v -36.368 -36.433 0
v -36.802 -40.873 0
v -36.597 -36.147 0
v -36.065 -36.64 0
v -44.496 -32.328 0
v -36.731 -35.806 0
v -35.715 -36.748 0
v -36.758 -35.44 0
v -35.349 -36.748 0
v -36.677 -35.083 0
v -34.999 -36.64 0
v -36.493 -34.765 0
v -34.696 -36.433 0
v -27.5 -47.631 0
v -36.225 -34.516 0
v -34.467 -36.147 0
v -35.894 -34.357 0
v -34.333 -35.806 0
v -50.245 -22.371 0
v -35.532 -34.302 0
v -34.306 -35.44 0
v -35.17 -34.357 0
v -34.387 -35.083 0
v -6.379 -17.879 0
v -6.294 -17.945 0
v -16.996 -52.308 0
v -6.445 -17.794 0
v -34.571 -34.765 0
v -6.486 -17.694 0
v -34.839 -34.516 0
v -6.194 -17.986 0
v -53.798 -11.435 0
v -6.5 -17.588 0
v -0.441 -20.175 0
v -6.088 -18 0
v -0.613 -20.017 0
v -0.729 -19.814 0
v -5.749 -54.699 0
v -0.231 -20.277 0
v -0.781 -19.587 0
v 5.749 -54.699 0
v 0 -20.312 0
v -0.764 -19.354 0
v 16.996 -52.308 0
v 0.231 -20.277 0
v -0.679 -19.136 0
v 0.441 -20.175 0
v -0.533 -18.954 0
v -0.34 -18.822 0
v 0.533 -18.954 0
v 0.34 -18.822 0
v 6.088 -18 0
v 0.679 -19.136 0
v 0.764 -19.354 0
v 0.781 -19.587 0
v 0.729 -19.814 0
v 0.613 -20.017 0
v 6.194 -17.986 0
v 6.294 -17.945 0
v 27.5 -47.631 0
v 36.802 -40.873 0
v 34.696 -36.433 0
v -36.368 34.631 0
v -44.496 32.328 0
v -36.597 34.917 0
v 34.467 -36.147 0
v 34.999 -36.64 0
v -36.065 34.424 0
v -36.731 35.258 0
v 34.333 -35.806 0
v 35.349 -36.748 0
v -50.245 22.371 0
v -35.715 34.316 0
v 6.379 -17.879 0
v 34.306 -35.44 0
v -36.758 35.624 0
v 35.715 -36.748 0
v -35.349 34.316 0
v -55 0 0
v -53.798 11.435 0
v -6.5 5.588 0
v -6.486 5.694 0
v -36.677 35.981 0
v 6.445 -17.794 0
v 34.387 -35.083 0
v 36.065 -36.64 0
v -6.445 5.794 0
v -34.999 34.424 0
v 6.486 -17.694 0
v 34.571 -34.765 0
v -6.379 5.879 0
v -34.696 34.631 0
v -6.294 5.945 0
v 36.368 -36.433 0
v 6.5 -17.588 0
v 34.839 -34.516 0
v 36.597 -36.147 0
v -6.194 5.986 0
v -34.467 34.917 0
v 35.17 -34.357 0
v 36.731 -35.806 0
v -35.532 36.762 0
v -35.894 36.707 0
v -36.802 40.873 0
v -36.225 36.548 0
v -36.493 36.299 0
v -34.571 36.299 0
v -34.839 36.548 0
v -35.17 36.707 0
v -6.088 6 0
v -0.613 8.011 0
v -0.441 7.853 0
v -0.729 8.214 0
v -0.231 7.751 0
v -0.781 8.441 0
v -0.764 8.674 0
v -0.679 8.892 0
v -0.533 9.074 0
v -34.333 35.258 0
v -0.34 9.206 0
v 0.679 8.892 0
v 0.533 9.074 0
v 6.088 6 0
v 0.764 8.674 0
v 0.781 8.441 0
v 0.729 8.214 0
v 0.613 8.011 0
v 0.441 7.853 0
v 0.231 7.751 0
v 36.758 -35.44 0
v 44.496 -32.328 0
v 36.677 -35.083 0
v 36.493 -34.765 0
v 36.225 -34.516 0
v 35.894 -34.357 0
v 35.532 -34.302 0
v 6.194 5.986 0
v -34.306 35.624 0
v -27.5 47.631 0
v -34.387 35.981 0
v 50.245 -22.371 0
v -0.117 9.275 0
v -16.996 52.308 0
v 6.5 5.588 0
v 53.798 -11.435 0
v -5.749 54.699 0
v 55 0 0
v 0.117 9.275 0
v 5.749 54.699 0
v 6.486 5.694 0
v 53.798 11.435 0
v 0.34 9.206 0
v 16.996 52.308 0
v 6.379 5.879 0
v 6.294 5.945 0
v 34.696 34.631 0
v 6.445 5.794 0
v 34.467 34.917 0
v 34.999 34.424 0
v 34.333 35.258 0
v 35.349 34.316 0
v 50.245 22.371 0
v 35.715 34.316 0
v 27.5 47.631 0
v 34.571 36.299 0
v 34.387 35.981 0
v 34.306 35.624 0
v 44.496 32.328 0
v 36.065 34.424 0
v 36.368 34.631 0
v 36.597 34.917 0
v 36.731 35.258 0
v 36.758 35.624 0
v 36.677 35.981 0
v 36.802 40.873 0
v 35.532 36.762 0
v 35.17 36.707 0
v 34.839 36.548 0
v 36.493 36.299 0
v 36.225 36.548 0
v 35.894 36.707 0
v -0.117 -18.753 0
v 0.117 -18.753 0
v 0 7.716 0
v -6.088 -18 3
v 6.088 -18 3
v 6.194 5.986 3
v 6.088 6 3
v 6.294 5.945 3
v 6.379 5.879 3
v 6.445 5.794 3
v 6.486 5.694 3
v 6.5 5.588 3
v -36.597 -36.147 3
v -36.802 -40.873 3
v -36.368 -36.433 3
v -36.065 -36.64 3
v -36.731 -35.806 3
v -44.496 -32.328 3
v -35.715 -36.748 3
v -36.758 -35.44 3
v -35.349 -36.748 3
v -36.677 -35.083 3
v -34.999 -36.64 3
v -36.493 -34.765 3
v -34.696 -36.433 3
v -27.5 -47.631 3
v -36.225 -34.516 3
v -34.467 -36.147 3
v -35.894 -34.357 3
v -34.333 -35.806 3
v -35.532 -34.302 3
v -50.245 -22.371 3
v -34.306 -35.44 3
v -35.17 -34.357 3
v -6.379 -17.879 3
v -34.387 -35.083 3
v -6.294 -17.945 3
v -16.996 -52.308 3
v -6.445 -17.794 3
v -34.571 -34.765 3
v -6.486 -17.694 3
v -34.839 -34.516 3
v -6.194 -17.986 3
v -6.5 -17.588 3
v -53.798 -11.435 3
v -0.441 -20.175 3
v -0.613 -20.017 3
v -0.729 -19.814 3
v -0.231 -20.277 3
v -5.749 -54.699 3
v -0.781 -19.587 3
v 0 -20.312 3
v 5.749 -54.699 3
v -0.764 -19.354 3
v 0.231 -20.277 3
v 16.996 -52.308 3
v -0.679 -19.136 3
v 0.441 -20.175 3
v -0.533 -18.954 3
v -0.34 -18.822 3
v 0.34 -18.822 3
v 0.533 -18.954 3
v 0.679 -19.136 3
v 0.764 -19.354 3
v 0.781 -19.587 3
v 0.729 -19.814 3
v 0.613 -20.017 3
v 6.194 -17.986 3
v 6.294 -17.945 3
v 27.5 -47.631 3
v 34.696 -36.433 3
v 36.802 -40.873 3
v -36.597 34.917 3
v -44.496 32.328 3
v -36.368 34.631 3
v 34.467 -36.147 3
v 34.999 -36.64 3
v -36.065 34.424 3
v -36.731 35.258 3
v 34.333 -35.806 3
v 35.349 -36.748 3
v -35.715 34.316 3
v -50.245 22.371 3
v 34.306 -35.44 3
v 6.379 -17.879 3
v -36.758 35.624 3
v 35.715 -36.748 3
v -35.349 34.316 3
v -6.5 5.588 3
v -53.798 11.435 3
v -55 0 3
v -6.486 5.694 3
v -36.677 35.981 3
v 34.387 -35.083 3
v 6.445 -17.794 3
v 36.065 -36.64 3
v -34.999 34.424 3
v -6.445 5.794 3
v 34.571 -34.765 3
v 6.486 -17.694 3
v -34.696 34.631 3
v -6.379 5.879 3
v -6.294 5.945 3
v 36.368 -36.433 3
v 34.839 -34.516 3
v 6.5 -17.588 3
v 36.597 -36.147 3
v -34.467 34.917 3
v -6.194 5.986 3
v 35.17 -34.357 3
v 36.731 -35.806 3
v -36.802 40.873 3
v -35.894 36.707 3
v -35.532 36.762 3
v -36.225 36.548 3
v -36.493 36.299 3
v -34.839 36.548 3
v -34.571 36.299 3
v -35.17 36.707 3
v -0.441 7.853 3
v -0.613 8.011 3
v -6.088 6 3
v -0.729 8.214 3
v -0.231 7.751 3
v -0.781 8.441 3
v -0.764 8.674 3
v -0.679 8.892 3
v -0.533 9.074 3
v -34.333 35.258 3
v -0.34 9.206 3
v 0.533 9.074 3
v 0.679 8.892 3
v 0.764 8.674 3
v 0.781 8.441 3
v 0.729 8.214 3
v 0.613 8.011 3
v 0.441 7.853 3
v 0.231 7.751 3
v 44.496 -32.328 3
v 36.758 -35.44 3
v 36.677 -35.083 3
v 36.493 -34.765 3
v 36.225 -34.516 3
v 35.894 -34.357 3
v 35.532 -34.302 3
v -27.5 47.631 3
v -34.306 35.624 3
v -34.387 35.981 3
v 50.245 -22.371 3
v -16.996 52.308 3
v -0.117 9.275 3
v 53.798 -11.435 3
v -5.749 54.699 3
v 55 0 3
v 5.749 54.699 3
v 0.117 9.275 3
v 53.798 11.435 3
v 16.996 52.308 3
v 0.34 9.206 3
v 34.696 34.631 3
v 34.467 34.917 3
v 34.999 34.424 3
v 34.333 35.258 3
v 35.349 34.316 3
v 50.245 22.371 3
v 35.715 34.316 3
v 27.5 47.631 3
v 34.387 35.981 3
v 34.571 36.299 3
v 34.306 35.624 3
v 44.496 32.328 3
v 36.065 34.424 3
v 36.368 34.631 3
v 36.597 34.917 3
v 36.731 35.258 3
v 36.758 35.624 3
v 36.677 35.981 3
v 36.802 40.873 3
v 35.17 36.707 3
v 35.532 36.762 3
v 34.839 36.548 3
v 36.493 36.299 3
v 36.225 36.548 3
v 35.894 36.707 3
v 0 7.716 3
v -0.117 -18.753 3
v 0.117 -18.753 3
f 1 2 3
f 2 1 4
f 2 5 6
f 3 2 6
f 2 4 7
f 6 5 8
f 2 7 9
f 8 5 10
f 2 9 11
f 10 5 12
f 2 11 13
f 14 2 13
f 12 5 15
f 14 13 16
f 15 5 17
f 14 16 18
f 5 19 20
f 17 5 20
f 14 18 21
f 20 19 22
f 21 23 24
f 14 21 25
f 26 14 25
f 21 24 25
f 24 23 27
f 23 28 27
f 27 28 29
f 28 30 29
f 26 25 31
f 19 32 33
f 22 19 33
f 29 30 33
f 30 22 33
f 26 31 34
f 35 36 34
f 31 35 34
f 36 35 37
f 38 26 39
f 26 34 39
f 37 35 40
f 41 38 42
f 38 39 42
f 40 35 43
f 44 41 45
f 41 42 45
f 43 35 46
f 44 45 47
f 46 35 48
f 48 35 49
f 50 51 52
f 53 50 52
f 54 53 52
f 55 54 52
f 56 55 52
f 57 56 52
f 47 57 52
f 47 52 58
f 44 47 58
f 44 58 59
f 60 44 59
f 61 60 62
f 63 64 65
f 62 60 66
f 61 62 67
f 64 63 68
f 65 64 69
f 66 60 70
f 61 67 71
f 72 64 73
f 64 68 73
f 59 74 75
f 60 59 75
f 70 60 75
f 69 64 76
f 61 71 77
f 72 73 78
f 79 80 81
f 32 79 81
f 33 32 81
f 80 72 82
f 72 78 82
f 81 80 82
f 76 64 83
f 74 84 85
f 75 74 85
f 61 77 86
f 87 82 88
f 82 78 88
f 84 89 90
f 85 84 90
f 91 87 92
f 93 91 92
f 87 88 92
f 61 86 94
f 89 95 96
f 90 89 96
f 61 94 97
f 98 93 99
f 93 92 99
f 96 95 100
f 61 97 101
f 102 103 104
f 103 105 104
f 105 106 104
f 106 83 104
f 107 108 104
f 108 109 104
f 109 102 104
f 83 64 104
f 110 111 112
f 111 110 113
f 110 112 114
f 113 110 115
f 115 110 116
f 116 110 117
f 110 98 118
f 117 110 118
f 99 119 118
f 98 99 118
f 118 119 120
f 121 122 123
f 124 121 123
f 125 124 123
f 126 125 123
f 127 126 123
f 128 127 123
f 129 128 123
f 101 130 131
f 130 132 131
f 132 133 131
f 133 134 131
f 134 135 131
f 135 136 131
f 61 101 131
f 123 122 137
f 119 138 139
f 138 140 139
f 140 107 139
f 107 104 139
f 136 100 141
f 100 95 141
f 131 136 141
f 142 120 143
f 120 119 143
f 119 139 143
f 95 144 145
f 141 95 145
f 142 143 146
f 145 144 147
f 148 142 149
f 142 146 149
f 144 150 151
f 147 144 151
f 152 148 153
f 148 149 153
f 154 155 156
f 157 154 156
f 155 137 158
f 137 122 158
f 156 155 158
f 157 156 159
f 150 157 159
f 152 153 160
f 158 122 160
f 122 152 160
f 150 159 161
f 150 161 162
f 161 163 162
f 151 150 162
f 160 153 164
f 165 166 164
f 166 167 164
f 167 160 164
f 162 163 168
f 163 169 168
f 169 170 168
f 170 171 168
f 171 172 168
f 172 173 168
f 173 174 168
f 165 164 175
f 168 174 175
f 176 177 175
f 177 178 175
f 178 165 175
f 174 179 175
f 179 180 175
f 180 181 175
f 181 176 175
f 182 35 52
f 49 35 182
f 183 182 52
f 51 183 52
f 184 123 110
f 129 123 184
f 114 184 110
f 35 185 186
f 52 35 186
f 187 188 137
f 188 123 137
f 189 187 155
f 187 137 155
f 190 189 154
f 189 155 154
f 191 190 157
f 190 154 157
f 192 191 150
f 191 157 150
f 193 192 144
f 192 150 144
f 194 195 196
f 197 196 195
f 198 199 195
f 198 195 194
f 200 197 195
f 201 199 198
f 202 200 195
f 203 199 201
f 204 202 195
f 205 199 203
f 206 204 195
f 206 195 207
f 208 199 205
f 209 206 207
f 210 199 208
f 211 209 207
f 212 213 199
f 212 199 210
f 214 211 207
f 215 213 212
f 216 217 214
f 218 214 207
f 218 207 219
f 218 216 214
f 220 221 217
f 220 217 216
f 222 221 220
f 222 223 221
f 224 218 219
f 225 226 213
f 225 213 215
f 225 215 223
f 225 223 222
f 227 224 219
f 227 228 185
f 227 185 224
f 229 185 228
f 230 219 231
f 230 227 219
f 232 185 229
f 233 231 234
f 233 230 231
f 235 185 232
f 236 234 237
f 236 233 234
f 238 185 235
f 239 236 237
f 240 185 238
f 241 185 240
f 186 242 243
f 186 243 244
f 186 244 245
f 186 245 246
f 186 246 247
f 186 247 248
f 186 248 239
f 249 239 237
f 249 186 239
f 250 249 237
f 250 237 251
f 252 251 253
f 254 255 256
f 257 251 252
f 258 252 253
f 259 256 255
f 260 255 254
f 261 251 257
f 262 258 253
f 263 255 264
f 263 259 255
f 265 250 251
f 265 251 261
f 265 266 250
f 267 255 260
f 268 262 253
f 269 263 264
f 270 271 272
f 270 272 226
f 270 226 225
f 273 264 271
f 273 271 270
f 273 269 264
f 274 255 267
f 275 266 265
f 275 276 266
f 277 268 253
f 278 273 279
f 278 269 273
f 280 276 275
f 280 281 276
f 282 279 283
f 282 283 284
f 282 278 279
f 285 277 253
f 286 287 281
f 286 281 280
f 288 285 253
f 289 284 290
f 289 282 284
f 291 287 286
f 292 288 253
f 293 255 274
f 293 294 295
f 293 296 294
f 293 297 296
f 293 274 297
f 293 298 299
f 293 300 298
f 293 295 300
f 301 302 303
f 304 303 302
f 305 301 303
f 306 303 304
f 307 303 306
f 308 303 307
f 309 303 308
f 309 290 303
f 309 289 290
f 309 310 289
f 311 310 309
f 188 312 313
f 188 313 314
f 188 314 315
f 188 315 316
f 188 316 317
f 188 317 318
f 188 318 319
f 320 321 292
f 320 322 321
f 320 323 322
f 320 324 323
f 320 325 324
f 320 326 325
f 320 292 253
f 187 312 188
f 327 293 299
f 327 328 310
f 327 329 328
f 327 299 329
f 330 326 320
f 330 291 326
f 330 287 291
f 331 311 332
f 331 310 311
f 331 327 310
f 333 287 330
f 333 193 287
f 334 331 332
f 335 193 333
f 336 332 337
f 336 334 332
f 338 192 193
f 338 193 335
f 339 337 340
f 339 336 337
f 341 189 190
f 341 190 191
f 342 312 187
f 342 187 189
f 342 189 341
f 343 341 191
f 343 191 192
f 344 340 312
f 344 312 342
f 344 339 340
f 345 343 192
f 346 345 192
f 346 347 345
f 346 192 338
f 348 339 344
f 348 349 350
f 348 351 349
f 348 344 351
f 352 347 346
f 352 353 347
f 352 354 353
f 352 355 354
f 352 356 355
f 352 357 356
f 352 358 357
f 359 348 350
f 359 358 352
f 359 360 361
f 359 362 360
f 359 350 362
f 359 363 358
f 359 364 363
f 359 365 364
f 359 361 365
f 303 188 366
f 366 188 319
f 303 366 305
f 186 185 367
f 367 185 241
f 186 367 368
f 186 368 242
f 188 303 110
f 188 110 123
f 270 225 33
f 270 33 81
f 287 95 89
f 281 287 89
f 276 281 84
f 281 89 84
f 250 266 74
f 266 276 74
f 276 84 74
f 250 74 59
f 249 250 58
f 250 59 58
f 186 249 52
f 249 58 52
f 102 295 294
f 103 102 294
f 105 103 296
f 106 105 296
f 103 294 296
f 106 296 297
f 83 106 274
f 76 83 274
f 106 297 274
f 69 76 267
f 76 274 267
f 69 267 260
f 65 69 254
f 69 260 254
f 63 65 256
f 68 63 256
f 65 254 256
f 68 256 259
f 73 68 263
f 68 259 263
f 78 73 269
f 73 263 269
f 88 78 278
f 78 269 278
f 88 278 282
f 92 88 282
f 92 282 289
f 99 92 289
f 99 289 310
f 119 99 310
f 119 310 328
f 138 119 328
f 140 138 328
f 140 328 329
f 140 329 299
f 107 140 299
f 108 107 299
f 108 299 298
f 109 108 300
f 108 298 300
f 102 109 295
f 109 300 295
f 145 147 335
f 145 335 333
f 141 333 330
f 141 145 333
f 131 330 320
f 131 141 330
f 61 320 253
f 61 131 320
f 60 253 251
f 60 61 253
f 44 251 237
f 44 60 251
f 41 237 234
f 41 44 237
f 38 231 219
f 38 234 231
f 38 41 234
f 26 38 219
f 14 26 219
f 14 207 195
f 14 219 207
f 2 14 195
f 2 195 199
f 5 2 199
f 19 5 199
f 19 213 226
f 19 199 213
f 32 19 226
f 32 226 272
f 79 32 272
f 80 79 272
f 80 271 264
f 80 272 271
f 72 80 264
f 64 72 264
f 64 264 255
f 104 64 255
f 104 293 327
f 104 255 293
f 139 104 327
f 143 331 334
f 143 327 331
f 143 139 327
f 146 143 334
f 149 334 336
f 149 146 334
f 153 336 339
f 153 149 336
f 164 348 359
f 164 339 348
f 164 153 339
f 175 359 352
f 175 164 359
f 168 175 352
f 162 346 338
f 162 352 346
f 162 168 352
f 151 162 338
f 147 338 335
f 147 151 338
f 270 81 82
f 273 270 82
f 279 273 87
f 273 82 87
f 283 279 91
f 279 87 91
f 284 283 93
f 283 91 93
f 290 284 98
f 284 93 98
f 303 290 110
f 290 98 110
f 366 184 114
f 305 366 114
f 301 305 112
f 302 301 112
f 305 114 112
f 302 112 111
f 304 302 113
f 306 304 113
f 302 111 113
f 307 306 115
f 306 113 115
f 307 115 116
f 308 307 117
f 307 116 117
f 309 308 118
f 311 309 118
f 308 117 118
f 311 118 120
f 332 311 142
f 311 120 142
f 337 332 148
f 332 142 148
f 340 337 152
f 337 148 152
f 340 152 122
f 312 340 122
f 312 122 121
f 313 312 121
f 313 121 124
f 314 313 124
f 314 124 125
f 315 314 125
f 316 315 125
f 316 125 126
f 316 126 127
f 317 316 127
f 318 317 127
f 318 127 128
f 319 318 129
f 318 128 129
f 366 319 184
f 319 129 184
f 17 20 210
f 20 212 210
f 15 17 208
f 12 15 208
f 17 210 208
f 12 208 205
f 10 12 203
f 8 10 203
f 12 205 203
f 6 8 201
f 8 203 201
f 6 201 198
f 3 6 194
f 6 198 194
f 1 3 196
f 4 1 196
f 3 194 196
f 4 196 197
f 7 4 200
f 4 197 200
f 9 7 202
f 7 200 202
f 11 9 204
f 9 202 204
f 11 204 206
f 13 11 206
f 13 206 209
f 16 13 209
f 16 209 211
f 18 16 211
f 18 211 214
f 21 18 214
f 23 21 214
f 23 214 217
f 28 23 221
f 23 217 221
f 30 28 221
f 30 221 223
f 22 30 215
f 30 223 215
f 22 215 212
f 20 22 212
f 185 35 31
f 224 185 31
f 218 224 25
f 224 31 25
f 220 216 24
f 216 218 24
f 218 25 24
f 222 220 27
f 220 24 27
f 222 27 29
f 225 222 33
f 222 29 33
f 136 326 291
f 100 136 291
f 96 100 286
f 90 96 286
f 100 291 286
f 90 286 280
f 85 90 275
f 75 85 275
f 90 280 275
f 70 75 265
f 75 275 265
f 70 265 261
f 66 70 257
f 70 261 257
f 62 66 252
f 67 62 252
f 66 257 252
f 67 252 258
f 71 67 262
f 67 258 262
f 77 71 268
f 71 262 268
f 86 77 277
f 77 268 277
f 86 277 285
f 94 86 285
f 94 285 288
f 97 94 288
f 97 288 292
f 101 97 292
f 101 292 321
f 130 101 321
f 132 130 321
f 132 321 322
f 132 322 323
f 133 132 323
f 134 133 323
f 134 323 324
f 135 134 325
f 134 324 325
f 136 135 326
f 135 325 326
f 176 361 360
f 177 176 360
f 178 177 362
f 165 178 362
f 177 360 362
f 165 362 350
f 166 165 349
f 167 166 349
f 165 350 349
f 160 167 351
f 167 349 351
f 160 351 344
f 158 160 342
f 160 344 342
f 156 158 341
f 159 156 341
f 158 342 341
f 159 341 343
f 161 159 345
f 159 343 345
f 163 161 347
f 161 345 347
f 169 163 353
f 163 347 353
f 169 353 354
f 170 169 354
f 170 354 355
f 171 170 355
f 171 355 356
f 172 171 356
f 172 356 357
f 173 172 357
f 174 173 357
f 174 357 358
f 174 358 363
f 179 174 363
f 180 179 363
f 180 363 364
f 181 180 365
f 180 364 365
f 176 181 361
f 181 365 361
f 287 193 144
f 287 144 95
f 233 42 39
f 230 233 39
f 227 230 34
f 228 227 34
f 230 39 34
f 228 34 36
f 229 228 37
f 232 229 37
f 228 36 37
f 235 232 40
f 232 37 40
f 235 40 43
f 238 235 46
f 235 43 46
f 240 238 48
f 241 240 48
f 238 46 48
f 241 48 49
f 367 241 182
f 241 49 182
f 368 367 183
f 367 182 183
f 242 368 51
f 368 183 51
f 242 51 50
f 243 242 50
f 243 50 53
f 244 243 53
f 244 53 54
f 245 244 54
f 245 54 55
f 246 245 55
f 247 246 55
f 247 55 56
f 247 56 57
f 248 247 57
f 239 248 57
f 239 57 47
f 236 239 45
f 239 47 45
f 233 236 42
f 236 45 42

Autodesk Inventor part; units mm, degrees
sketch "Sketch1" plane through (0, 0, 0) normal (0, 0, 1) x (1, 0, 0)
  circle A0 centre (0, 0) radius 55
  dimension "d0" = 110
extrude "Extrusion1" add sketch "Sketch1" along normal blind 3
ref_plane "Work Plane1" through (0, 0, 4) normal (0, 0, 1) x (1, 0, 0)
sketch "Sketch2" plane through (0, 0, 4) normal (0, 0, 1) x (1, 0, 0)
  line L0 (-6.5, 6) -> (6.5, 6)
  line L1 (6.5, 6) -> (6.5, -18)
  line L2 (-6.5, -18) -> (-6.5, 6)
  circle A0 centre (-35.532, 35.532) radius 1.5
  circle A1 centre (-35.532, -35.532) radius 1.5
  circle A2 centre (35.532, -35.532) radius 1.5
  circle A3 centre (35.532, 35.532) radius 1.5
  line L3 (-6.5, -18) -> (6.5, -18)
  circle A4 centre (0, 8.5) radius 1
  circle A5 centre (0, -19.528) radius 1.9565
  point P0 (0, 0)
  point P1 (0, 6)
  point P2 (0, -13.848)
  dimension "d4" = 13
  dimension "d7" = 3
  dimension "d8" = 3
  dimension "d9" = 3
  dimension "d10" = 3
  dimension "d15" = 35.532
  dimension "d16" = 35.532
  dimension "d17" = 35.532
  dimension "d18" = 35.532
  dimension "d19" = 35.532
  dimension "d20" = 35.532
  dimension "d21" = 35.532
  dimension "d22" = 35.532
  dimension "d138" = 6
  dimension "d139" = 24
  dimension "d140" = 2
  dimension "d141" = 2.5
  dimension "d142" = 1.528
extrude "Extrusion2" cut sketch "Sketch2" against normal blind 4 contours L0 L1 L3 A5 L2 | A5 L3 picked at (0, -17.8572)
ref_plane "Work Plane2" through (0, 0, 3) normal (0, 0, 1) x (1, 0, 0)
sketch "Sketch3" plane through (0, 0, 3) normal (0, 0, 1) x (1, 0, 0)
  circle A0 centre (-35.577, 35.5342) radius 2.5
  circle A1 centre (-35.5225, -35.5931) radius 2.5
  circle A2 centre (35.5095, -35.5931) radius 2.5
  circle A3 centre (35.5095, 35.4262) radius 2.5
  point P0 (0, 0)
ref_plane "Work Plane3" through (0, 0, -1) normal (0, 0, 1) x (1, 0, 0)
ref_plane "Work Plane4" through (0, 0, 0) normal (0, 0, -1) x (-1, 0, 0)
sketch "Sketch5" plane through (0, 0, 0) normal (0, 0, -1) x (-1, 0, 0)
  line L0 (-9.906, 9.652) -> (9.906, 9.652)
  line L1 (9.906, 9.652) -> (9.906, -30.226)
  line L2 (9.906, -30.226) -> (-9.906, -30.226)
  line L3 (-9.906, -30.226) -> (-9.906, 9.652)
  circle A0 centre (-35.532, 35.532) radius 1.5
  circle A1 centre (-35.532, -35.532) radius 1.5
  circle A2 centre (35.532, -35.532) radius 1.5
  circle A3 centre (35.532, 35.532) radius 1.5
  circle A4 centre (-5.08, 13.462) radius 1
  circle A5 centre (5.08, 13.462) radius 1
  circle A6 centre (-5.08, -34.036) radius 1
  circle A7 centre (5.08, -34.036) radius 1
  point P0 (0, 0)
  point P1 (0, 0)
  point P2 (0, 9.652)
  point P3 (0, -30.226)
  dimension "d53" = 19.812
  dimension "d54" = 39.878
  dimension "d55" = 9.652
  dimension "d56" = 3
  dimension "d57" = 3
  dimension "d58" = 3
  dimension "d59" = 3
  dimension "d60" = 2
  dimension "d61" = 2
  dimension "d62" = 2
  dimension "d63" = 2
  dimension "d64" = 35.532
  dimension "d65" = 35.532
  dimension "d66" = 35.532
  dimension "d67" = 35.532
  dimension "d68" = 35.532
  dimension "d69" = 35.532
  dimension "d70" = 35.532
  dimension "d71" = 35.532
  dimension "d72" = 10.16
  dimension "d73" = 10.16
  dimension "d74" = 3.81
  dimension "d75" = 3.81
  dimension "d76" = 3.81
  dimension "d77" = 3.81
  dimension "d78" = 30.226
  dimension "d79" = 5.08
  dimension "d80" = 5.08
  dimension "d81" = 5.08
  dimension "d82" = 5.08
hole "Hole1" at (35.532, 35.532, 0) at (-35.532, 35.532, 0) at (35.532, -35.532, 0) at (-35.532, -35.532, 0) direction (0, 0, 1) diameter 2.459 depth 4 tip angle 118 thread size "M3x0.5" class "6H" standard "ANSI Metric M Profile"
ref_plane "Work Plane5" through (0, 0, 0) normal (0, 0, -1) x (-1, 0, 0)
fillet "Fillet1" radius 0.4125 4 edges at (6.5, -18, 1.5) (-6.5, -18, 1.5) (6.5, 6, 1.5) (-6.5, 6, 1.5)
ref_plane "Work Plane6" through (0, 0, 0) normal (0, 0, -1) x (-1, 0, 0)
ref_plane "Work Plane7" through (0, 0, 3) normal (0, 0, 1) x (1, 0, 0)
sketch "Sketch8" plane through (0, 0, 3) normal (0, 0, 1) x (1, 0, 0)
  circle A0 centre (0, -19.528) radius 1
  circle A1 centre (0, 8.5) radius 1
  line L0 (6.0875, -18) -> (-6.0875, -18) projected
  line L1 (-6.0875, 6) -> (6.0875, 6) projected
  point P0 (0, 0)
  point P1 (0, -18)
  point P2 (0, -18)
  dimension "d144" = 2
  dimension "d145" = 2
  dimension "d146" = 1.528
  dimension "d147" = 2.5
hole "Hole3" at (0, 8.5, 3) at (0, -19.528, 3) direction (0, 0, -1) diameter 1.567 depth 6.3 tip angle 118 thread size "M2x0.4" class "6H" standard "ANSI Metric M Profile"
properties part number "bottom-plate"
